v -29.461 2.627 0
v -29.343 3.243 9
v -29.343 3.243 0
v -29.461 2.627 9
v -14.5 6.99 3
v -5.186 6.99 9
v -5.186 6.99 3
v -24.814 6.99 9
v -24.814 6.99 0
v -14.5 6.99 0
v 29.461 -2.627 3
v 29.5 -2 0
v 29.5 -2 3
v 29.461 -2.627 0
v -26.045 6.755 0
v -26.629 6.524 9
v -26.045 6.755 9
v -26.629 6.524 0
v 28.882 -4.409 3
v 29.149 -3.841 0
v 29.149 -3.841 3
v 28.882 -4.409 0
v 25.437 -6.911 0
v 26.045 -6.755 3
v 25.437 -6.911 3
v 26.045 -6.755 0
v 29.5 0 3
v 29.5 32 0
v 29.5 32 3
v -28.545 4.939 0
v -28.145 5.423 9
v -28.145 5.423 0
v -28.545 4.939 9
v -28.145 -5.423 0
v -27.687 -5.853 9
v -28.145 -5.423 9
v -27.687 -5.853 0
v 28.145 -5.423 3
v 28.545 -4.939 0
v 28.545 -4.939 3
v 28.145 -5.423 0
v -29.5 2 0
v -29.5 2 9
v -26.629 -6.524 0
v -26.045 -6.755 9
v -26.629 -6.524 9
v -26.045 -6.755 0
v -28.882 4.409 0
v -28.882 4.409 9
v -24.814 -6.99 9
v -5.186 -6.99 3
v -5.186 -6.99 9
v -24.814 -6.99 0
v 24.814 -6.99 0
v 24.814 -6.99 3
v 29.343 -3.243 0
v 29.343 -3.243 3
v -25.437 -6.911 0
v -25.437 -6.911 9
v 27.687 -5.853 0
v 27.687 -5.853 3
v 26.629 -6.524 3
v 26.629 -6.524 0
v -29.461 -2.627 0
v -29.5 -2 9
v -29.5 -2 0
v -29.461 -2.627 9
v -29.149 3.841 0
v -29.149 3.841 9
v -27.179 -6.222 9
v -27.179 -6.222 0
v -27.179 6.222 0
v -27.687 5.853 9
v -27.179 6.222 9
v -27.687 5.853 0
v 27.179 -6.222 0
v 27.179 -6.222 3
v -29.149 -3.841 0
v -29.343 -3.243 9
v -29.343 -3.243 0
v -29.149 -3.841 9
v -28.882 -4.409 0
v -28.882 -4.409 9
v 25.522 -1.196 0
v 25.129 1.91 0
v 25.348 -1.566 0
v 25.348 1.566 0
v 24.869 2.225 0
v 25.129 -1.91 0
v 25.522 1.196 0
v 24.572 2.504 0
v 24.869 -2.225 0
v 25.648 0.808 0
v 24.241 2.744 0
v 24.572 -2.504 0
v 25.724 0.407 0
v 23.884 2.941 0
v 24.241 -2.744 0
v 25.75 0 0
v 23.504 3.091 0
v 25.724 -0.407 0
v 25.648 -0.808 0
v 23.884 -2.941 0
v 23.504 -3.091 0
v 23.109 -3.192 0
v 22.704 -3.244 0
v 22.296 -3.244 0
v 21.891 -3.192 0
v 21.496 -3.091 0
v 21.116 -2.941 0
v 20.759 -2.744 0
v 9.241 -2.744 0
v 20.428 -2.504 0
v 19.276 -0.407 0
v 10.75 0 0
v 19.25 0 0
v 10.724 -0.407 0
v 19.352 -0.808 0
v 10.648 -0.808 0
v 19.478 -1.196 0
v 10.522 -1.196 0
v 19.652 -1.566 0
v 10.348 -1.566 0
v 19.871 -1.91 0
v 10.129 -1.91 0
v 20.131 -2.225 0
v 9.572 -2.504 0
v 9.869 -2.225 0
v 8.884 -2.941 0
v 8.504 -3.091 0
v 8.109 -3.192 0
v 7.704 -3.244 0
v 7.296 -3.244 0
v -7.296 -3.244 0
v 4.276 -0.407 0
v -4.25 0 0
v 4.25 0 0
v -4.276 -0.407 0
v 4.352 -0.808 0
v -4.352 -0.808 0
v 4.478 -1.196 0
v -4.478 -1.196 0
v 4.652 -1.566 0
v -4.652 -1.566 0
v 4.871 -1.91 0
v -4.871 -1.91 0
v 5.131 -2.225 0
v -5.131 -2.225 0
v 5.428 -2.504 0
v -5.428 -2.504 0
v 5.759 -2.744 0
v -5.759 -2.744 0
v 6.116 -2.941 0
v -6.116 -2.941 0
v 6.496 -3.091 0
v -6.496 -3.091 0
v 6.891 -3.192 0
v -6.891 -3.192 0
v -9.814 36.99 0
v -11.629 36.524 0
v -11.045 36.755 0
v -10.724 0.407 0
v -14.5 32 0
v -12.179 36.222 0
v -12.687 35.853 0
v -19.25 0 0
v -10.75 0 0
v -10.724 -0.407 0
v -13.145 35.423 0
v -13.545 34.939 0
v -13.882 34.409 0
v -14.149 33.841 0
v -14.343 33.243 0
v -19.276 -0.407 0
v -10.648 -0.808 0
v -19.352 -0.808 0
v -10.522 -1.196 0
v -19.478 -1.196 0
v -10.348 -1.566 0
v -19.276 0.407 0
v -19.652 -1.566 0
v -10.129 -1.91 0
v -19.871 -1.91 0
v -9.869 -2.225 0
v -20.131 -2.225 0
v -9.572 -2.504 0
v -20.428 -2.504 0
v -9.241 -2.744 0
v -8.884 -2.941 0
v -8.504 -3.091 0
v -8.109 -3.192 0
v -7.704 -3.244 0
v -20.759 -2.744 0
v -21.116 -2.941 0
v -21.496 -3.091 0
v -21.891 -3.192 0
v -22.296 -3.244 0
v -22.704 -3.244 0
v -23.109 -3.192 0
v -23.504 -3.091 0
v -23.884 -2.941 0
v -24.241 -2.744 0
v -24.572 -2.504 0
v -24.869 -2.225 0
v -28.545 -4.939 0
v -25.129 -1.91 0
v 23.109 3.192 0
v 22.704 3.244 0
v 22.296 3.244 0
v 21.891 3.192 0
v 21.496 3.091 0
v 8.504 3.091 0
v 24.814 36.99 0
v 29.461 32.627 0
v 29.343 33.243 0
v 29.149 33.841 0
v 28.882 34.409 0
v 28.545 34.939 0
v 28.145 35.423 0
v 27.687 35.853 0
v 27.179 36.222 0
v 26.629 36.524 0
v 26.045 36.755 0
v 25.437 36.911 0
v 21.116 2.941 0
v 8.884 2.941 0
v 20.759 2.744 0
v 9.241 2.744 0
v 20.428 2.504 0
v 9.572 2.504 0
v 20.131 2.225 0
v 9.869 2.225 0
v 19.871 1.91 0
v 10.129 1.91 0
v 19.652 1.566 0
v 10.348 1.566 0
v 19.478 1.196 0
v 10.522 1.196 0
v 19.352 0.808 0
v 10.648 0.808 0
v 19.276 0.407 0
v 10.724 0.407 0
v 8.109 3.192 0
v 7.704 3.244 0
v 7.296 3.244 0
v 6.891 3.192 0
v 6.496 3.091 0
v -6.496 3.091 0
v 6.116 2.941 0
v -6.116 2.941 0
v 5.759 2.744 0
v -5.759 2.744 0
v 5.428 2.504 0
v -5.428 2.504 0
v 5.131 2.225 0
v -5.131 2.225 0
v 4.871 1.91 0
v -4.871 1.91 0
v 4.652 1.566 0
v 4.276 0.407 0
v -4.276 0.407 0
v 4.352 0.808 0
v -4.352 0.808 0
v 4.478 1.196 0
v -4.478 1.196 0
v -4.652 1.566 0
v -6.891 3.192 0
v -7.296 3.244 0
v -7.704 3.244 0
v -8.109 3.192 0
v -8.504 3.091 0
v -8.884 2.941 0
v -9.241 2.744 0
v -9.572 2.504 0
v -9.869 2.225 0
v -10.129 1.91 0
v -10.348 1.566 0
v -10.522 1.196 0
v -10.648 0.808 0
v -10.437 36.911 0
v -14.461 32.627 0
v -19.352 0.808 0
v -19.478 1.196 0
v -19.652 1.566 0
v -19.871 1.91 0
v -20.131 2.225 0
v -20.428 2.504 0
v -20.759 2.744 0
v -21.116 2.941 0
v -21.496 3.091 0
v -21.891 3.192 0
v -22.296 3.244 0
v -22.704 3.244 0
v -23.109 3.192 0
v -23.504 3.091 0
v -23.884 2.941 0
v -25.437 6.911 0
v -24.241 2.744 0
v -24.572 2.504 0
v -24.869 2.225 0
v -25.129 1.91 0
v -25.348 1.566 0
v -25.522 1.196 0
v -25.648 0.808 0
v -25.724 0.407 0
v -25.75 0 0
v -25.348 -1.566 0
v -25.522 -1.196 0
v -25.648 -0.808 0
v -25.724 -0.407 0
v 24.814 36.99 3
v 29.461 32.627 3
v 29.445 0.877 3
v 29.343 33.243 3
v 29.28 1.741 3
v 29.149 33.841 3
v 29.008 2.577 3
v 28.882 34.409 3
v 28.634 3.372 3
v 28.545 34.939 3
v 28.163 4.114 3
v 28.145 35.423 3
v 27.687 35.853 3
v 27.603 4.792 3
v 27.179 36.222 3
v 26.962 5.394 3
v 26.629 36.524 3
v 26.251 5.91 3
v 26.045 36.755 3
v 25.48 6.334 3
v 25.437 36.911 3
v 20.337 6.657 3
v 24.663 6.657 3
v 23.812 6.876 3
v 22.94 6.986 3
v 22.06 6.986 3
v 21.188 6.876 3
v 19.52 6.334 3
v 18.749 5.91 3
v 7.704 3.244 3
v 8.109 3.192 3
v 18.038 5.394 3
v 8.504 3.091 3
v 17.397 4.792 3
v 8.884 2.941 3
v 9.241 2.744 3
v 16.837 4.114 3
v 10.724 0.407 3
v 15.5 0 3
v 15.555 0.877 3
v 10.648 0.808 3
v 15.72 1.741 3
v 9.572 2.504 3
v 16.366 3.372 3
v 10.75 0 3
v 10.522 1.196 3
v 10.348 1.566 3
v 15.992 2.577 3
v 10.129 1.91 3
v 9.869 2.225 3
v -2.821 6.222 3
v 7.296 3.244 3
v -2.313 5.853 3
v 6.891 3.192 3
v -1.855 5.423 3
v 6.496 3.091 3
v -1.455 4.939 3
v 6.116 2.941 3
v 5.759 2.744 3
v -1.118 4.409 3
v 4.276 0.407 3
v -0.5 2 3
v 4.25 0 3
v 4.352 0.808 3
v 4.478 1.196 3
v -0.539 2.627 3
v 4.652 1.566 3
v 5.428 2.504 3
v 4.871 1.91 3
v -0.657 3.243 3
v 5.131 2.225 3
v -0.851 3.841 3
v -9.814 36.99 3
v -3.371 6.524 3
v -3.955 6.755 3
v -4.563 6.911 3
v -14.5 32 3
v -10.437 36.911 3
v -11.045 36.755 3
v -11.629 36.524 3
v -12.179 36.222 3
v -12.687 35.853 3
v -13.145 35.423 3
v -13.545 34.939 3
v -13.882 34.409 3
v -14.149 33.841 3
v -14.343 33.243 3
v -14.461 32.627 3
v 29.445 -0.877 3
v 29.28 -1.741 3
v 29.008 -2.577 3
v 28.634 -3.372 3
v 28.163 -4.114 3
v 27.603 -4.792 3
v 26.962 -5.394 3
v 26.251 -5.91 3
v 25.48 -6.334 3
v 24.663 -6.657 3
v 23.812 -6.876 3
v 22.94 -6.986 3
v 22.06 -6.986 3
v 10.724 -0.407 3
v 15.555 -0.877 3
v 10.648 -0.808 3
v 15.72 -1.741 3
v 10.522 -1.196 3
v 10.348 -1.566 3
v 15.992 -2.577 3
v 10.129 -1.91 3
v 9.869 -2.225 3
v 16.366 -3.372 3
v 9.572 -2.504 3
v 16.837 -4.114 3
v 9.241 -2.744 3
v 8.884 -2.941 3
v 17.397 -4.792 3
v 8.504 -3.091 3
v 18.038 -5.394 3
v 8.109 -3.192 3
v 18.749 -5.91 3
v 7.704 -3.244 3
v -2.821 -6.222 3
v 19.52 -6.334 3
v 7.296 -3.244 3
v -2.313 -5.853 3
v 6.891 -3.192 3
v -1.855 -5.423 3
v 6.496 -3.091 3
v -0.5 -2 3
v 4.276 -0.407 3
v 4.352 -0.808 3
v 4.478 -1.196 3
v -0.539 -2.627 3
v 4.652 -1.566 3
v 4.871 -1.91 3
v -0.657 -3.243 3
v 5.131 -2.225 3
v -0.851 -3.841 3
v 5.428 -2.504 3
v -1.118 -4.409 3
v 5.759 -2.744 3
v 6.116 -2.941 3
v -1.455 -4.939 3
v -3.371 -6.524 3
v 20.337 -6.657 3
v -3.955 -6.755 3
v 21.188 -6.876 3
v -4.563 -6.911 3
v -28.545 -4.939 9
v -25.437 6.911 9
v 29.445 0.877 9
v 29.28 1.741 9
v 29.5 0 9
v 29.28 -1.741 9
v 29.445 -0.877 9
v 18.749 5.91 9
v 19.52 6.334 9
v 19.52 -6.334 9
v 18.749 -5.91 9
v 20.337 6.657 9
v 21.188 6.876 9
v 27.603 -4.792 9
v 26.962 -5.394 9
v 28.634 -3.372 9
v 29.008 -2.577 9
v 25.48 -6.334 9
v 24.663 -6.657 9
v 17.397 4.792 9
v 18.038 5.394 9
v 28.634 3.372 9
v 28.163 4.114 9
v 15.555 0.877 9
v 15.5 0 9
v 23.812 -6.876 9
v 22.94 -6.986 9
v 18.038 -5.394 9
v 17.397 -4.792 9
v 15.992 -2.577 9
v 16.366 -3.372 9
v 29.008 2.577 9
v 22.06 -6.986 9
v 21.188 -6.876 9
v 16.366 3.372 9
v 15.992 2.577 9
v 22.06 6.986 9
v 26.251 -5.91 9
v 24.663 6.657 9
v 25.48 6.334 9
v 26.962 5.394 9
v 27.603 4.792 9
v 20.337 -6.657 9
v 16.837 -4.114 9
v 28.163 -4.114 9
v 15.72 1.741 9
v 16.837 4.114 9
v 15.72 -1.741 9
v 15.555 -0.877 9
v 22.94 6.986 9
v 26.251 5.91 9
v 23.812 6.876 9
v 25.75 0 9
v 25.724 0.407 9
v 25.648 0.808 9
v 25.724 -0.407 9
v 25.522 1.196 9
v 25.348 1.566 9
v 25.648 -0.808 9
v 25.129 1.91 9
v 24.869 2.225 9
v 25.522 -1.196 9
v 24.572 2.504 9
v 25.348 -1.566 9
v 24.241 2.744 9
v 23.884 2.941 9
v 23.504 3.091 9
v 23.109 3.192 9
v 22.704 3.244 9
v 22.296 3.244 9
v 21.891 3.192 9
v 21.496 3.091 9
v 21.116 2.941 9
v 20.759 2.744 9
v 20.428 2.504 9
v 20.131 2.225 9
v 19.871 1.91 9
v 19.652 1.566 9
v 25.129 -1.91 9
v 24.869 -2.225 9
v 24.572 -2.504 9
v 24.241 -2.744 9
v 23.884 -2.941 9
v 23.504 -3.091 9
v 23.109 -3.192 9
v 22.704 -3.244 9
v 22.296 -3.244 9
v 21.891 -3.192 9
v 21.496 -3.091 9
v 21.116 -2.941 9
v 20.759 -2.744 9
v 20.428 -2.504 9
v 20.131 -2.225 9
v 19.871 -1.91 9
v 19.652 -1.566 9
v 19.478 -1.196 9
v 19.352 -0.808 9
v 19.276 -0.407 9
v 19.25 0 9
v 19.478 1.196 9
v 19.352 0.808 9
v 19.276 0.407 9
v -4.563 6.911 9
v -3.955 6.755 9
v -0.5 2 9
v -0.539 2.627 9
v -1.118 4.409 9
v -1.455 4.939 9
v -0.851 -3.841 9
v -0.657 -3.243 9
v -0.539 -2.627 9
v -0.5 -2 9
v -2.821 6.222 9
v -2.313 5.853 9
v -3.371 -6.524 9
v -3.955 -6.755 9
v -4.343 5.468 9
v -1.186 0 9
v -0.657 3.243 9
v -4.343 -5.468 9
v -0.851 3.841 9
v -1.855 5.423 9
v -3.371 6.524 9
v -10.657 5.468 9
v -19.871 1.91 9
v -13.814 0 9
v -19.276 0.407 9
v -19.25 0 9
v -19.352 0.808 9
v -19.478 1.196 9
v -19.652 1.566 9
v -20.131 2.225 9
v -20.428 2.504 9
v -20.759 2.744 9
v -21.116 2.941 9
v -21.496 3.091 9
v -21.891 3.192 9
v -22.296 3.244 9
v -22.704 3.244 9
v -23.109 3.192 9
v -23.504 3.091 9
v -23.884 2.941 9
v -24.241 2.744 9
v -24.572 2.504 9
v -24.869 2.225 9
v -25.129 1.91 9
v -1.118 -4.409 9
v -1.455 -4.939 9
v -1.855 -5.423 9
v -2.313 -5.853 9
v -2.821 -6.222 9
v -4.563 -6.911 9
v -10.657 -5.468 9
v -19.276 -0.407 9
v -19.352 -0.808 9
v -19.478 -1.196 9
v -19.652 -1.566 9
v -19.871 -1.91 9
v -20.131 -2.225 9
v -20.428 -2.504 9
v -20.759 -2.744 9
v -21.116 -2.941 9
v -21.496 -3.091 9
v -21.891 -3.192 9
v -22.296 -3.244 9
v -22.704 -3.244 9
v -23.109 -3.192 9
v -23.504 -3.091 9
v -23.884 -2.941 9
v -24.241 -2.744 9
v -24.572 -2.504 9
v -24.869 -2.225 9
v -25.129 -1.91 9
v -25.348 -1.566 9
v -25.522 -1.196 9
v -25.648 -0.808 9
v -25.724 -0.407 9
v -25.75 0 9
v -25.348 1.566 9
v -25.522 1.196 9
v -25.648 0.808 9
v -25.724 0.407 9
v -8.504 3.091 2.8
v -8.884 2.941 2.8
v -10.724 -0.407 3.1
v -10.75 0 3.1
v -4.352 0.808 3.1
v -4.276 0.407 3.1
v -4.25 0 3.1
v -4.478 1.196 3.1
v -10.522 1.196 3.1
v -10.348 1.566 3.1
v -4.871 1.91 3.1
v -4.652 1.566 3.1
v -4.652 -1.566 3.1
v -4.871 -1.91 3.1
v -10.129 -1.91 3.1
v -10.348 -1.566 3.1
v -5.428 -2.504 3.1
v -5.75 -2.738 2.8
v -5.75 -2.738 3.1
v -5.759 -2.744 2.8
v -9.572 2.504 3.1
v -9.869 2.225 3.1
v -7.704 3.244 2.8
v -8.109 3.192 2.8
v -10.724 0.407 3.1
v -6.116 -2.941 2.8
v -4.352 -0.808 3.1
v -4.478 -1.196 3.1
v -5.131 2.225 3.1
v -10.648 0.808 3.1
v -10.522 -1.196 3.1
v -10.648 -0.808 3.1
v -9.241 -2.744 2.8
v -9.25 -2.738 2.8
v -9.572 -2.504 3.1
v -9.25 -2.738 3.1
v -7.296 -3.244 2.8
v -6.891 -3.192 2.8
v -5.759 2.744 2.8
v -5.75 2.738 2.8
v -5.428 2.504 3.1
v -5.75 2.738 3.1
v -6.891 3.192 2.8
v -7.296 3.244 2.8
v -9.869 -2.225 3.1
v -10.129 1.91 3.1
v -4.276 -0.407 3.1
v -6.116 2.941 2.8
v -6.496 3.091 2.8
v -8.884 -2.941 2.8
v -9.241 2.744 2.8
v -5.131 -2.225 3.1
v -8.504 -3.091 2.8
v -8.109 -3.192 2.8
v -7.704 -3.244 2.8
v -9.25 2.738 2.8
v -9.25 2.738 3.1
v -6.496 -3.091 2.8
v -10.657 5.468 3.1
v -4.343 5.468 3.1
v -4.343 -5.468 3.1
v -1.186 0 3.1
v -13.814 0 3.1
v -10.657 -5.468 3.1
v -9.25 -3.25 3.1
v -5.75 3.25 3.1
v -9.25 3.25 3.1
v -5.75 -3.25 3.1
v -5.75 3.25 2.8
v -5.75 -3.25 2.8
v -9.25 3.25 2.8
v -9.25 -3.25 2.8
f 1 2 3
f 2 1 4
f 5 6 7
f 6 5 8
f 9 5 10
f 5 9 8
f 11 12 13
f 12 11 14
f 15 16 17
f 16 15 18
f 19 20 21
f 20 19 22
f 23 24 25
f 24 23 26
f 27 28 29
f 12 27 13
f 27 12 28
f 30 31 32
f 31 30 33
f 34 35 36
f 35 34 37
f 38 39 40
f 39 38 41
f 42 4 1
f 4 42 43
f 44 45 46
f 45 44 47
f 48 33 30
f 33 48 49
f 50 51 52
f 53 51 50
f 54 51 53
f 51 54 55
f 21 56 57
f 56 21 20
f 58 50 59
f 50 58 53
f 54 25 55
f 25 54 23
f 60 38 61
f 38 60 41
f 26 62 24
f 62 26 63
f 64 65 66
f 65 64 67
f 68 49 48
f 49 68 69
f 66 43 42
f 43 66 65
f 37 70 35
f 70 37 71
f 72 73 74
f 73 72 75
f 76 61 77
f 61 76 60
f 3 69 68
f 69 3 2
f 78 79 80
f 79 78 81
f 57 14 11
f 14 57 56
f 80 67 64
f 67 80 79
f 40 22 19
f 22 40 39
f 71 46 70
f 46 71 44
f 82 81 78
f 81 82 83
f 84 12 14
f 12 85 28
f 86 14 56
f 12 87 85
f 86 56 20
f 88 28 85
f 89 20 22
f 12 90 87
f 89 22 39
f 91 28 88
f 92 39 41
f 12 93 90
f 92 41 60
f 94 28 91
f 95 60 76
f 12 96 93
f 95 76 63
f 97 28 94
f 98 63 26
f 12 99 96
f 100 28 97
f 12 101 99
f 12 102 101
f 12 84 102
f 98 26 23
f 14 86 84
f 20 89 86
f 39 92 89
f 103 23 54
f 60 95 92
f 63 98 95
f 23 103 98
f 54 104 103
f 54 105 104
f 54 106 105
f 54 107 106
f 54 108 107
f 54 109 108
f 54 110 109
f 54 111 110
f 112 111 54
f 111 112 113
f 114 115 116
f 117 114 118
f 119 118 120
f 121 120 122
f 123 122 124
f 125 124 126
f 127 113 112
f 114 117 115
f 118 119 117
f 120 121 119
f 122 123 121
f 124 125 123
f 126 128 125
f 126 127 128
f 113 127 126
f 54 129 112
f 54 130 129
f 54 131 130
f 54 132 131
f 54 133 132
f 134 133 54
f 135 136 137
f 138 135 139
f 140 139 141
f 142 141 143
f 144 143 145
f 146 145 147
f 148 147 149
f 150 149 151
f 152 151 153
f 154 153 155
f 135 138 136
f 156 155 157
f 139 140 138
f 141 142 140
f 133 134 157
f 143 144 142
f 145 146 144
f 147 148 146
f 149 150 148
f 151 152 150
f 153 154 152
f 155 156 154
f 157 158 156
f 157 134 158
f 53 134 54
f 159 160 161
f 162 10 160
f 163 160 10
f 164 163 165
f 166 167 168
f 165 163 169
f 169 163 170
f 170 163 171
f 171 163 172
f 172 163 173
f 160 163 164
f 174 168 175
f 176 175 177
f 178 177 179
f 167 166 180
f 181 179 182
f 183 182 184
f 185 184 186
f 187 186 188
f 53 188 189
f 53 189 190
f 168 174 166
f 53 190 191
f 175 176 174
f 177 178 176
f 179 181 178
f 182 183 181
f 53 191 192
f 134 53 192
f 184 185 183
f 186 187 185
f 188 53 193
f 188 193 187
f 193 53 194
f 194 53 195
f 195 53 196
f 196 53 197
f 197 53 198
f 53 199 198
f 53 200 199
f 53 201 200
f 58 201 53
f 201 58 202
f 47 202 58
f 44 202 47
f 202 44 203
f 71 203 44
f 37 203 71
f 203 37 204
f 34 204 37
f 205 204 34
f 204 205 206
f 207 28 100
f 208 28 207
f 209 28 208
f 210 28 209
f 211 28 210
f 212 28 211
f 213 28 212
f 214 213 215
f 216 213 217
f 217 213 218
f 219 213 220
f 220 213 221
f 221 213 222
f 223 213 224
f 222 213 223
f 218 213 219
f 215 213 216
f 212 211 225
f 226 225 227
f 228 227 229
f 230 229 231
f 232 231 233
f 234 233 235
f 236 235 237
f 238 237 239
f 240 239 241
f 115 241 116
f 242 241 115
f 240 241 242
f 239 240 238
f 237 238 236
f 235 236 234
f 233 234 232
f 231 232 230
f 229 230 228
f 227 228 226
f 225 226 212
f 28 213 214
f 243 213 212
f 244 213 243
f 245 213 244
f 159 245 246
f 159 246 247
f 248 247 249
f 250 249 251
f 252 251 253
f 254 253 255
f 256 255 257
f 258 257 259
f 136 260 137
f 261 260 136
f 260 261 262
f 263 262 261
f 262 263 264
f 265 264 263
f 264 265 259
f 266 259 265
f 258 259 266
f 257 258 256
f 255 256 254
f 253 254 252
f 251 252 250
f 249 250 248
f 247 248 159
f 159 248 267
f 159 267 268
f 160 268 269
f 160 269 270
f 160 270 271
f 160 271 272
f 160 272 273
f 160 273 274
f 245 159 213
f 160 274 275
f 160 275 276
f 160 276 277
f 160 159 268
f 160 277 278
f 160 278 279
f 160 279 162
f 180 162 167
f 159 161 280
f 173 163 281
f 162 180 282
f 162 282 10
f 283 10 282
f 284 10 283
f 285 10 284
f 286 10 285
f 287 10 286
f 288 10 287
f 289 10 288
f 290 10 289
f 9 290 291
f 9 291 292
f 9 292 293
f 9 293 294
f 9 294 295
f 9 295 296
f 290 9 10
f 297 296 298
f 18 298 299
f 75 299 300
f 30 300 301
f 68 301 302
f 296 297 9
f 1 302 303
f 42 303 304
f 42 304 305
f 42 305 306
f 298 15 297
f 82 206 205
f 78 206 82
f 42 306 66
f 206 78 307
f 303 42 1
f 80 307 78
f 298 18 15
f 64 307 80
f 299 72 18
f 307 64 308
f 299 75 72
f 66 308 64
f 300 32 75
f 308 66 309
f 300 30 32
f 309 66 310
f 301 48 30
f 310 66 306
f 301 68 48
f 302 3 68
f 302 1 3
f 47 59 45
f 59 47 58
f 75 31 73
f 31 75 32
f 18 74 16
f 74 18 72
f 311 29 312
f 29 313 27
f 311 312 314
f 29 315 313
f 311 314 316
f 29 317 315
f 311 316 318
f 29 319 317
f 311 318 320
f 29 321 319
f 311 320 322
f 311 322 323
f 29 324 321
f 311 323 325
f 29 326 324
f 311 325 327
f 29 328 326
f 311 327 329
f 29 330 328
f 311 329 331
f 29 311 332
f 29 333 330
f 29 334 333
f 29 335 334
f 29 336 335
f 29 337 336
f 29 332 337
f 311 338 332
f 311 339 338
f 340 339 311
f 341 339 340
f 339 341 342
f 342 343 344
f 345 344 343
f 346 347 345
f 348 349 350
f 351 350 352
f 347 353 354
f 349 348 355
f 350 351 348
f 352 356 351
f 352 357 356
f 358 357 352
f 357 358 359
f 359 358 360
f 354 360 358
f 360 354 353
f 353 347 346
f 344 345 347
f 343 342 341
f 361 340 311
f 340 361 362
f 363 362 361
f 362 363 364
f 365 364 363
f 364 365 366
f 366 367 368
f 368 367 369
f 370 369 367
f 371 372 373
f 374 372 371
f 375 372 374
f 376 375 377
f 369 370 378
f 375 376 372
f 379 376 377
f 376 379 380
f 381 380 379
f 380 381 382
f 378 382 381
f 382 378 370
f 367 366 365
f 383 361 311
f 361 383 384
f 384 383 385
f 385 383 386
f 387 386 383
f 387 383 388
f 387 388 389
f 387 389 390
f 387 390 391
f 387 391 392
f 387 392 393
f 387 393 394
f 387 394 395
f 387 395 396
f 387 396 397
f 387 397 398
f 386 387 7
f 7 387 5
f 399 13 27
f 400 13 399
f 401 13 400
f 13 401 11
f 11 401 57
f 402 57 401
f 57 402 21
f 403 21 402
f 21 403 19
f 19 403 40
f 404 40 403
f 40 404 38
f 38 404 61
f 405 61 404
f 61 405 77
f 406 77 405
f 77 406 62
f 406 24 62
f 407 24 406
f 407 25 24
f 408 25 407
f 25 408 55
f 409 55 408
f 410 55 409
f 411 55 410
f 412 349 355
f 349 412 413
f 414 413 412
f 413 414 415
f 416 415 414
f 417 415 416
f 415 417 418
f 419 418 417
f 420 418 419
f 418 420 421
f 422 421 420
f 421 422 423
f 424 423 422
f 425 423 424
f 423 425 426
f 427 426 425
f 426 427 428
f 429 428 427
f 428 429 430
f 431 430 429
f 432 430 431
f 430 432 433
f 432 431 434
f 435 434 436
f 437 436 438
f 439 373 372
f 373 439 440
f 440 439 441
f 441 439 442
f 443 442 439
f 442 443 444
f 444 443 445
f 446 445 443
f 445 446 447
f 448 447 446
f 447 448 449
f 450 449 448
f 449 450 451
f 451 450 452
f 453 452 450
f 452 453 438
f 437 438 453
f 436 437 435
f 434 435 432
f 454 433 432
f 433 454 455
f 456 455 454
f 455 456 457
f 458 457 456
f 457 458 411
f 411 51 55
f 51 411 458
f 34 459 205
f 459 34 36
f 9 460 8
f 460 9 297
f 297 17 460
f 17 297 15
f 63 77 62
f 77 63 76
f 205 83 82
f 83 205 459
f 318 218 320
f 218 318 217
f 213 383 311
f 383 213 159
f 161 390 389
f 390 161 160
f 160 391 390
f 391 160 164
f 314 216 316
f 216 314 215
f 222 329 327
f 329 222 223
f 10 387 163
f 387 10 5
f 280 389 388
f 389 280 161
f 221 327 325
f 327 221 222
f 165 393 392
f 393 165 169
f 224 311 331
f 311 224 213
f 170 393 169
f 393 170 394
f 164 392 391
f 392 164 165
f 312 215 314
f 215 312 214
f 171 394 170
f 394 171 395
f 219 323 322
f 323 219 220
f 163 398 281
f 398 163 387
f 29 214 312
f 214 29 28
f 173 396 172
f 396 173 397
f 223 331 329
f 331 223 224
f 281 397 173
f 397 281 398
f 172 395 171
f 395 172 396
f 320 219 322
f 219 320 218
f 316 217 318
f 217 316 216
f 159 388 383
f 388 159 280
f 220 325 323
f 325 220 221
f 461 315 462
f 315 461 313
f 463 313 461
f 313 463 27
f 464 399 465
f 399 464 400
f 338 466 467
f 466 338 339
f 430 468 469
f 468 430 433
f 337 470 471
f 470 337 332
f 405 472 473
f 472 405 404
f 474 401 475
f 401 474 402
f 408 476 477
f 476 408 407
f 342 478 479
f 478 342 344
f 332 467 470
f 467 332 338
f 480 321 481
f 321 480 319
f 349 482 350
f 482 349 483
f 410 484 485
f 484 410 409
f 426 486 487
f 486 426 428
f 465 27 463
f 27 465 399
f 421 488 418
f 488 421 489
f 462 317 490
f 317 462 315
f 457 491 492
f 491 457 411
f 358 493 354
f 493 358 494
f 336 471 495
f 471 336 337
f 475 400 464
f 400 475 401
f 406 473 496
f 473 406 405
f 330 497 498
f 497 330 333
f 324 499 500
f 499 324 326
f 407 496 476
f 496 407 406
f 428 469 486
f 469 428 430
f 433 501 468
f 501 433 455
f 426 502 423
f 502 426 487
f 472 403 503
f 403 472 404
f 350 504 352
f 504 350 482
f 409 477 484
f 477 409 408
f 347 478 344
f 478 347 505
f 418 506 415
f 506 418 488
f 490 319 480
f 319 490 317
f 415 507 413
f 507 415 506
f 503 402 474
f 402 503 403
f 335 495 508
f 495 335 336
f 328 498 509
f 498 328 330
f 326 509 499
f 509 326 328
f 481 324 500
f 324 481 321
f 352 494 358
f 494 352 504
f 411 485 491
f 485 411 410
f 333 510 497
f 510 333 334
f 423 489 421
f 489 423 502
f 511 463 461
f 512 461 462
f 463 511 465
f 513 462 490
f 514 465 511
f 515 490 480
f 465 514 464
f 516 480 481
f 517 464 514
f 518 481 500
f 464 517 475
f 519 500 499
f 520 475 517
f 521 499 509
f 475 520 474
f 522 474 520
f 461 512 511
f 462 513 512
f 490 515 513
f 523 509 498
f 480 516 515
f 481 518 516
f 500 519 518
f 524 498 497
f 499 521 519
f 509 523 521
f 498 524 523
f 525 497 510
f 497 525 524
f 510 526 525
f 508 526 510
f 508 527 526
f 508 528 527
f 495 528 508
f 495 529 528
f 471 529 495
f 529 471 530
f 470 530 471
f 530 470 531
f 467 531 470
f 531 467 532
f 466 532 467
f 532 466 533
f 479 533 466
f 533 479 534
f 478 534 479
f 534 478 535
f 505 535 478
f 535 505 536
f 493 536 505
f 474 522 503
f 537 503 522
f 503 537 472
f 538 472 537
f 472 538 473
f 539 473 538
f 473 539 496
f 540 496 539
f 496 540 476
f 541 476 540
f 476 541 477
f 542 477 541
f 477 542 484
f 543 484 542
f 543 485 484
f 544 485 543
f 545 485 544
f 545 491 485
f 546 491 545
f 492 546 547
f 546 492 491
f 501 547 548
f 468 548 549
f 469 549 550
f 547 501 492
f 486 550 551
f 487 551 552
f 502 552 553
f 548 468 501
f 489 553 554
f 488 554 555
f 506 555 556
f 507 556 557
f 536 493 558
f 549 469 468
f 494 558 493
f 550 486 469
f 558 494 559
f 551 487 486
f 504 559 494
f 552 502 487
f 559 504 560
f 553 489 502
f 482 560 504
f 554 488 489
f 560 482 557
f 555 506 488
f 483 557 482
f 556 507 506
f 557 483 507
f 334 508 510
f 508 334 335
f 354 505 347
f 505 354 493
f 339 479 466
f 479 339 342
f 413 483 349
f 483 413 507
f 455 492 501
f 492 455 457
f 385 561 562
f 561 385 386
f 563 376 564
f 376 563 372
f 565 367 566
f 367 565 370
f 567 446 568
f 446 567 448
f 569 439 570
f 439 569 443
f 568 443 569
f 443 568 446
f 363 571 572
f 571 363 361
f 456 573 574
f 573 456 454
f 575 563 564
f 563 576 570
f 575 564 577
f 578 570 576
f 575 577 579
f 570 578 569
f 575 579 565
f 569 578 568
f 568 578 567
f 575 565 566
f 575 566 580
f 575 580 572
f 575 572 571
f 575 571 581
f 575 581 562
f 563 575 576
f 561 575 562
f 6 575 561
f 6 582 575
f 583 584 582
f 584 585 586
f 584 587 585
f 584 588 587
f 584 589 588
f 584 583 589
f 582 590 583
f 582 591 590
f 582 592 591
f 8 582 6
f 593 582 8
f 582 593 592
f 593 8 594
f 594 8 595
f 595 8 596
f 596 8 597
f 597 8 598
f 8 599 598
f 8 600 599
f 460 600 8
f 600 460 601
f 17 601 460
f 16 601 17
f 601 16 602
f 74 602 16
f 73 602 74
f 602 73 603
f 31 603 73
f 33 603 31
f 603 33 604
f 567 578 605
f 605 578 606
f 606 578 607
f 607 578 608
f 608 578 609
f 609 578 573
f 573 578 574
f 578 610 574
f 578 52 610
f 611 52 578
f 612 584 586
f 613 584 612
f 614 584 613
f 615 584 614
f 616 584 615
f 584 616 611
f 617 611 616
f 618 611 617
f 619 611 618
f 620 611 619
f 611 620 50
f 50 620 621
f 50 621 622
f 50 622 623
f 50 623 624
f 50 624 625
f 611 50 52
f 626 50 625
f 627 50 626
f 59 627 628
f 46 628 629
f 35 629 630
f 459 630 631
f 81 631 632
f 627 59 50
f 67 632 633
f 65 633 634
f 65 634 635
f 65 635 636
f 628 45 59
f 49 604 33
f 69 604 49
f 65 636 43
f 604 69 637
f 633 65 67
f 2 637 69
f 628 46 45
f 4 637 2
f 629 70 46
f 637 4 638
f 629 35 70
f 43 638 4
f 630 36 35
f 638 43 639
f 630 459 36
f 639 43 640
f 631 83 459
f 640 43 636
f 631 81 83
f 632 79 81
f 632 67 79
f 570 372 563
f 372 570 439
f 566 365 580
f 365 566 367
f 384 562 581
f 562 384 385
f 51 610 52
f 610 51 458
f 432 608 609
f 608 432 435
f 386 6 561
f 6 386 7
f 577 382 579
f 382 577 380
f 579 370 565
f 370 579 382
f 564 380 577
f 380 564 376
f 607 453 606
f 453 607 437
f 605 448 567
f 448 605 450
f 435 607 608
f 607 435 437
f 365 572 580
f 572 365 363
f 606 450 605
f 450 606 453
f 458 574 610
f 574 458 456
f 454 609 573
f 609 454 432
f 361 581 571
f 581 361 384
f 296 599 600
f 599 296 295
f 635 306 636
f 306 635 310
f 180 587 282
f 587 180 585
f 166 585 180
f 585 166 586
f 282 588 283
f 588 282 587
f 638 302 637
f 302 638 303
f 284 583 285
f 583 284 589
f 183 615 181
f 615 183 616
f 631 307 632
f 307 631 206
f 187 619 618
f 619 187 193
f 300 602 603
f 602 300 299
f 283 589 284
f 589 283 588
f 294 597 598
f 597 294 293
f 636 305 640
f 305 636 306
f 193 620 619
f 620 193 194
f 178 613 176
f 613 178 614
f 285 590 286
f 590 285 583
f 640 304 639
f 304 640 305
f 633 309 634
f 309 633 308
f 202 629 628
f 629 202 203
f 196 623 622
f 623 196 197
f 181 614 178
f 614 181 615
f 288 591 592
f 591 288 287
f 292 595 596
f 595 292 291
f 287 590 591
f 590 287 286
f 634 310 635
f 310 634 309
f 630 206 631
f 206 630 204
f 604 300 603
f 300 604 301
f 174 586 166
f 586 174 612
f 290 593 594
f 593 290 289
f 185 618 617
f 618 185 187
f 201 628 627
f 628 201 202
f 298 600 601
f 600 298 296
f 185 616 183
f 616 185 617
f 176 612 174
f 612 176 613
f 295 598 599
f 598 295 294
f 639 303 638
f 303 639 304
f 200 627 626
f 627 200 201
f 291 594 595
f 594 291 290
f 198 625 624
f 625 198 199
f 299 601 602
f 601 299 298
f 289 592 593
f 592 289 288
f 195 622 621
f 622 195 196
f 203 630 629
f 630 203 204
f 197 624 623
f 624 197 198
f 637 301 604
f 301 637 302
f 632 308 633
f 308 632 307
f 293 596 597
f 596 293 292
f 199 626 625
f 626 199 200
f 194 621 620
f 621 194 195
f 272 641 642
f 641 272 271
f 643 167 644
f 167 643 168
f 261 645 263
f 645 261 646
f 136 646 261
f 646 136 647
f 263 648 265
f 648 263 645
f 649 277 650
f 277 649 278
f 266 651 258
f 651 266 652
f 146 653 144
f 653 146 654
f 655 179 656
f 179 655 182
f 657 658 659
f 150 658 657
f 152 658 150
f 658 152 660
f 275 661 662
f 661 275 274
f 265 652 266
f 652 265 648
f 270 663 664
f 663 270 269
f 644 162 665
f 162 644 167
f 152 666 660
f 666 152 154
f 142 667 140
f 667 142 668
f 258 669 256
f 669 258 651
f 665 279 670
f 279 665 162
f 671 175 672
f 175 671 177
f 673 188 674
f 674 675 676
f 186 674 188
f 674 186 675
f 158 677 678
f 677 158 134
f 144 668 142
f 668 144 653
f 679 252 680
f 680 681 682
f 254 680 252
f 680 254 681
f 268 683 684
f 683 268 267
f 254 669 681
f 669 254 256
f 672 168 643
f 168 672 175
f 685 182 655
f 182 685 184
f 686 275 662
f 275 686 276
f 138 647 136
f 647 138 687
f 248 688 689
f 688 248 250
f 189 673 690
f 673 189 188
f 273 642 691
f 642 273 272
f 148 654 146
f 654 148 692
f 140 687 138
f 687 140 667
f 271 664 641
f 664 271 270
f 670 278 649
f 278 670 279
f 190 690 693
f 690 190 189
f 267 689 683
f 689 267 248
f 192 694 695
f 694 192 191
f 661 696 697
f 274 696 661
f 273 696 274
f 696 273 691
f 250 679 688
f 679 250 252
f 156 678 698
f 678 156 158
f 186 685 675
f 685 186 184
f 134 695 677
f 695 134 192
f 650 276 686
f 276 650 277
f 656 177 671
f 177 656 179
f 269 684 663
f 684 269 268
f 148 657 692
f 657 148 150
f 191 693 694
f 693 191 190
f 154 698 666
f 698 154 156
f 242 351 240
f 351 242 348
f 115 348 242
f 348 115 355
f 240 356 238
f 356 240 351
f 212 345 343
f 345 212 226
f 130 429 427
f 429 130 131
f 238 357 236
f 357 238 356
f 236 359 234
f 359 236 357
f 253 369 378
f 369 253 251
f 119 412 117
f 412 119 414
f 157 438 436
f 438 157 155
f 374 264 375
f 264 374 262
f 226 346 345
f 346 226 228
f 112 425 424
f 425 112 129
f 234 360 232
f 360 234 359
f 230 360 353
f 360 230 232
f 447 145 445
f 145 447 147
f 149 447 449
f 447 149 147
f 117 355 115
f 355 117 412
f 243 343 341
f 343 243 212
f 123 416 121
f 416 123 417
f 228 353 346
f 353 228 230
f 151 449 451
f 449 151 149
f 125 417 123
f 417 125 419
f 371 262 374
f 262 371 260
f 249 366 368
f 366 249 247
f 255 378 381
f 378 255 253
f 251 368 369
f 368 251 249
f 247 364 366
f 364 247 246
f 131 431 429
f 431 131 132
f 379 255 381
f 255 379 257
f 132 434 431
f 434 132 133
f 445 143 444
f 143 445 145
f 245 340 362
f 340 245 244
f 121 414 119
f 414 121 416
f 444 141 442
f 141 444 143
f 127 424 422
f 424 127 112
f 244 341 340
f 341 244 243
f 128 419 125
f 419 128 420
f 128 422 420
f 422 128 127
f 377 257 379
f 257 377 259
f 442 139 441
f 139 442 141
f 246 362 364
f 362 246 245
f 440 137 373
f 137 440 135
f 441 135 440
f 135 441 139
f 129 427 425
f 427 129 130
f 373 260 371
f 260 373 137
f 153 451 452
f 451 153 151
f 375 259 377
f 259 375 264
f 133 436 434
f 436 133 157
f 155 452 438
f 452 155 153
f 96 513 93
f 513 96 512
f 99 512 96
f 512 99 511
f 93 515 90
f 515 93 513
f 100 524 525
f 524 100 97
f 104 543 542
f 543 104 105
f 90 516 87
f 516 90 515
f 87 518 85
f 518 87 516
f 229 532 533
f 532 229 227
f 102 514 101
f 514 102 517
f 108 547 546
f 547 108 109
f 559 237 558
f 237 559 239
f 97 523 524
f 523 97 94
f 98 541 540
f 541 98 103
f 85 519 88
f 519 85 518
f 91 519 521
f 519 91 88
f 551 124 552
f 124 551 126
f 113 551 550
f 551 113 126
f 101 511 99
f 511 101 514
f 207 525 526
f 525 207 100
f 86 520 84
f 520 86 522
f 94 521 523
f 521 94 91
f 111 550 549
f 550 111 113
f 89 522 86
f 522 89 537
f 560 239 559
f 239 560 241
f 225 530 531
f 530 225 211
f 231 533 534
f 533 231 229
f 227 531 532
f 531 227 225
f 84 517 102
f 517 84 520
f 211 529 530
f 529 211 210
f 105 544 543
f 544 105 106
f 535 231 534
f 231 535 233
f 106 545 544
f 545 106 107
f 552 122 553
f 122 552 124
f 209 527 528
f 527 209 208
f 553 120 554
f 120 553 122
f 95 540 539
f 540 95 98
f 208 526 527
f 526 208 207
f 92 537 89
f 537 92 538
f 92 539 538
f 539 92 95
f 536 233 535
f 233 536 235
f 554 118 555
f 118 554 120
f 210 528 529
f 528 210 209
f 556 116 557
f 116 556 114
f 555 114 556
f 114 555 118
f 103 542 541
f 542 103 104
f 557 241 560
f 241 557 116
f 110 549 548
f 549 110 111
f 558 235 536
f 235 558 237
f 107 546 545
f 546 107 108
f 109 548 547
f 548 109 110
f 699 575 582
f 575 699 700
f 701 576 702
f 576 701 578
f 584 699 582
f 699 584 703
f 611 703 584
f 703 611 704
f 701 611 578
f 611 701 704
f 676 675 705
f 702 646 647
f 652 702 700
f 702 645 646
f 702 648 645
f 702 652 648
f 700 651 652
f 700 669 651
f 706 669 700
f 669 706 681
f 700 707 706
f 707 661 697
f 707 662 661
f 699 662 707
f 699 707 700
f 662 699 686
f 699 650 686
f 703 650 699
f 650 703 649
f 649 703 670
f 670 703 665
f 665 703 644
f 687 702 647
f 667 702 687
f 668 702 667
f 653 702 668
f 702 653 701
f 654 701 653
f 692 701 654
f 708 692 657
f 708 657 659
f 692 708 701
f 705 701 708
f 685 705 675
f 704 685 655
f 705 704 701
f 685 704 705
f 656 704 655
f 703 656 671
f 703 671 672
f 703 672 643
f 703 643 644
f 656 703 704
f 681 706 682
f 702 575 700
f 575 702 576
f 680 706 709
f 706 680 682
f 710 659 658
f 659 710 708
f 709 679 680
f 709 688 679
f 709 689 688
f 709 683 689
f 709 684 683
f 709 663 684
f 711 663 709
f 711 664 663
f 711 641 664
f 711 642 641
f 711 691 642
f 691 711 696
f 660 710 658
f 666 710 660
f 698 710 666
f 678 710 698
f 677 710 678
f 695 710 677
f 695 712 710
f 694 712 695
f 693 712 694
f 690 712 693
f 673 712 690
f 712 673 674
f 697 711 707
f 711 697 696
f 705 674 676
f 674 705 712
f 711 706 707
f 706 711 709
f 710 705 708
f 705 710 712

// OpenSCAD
$fn = 50;


difference() {
	union() {
		translate(v = [0, 0, 0]) {
			rotate(a = [0, 0, 0]) {
				hull() {
					translate(v = [-24.5000000000, 2.0000000000, 0]) {
						rotate(a = [0, 0, 0]) {
							translate(v = [0, 0, 0]) {
								rotate(a = [0, 0, 0]) {
									cylinder(h = 3, r = 5);
								}
							}
						}
					}
					translate(v = [24.5000000000, 2.0000000000, 0]) {
						rotate(a = [0, 0, 0]) {
							translate(v = [0, 0, 0]) {
								rotate(a = [0, 0, 0]) {
									cylinder(h = 3, r = 5);
								}
							}
						}
					}
					translate(v = [-24.5000000000, -2.0000000000, 0]) {
						rotate(a = [0, 0, 0]) {
							translate(v = [0, 0, 0]) {
								rotate(a = [0, 0, 0]) {
									cylinder(h = 3, r = 5);
								}
							}
						}
					}
					translate(v = [24.5000000000, -2.0000000000, 0]) {
						rotate(a = [0, 0, 0]) {
							translate(v = [0, 0, 0]) {
								rotate(a = [0, 0, 0]) {
									cylinder(h = 3, r = 5);
								}
							}
						}
					}
				}
			}
		}
		translate(v = [7.5000000000, 15.0000000000, 0]) {
			rotate(a = [0, 0, 0]) {
				hull() {
					translate(v = [-17.0000000000, 17.0000000000, 0]) {
						rotate(a = [0, 0, 0]) {
							translate(v = [0, 0, 0]) {
								rotate(a = [0, 0, 0]) {
									cylinder(h = 3, r = 5);
								}
							}
						}
					}
					translate(v = [17.0000000000, 17.0000000000, 0]) {
						rotate(a = [0, 0, 0]) {
							translate(v = [0, 0, 0]) {
								rotate(a = [0, 0, 0]) {
									cylinder(h = 3, r = 5);
								}
							}
						}
					}
					translate(v = [-17.0000000000, -17.0000000000, 0]) {
						rotate(a = [0, 0, 0]) {
							translate(v = [0, 0, 0]) {
								rotate(a = [0, 0, 0]) {
									cylinder(h = 3, r = 5);
								}
							}
						}
					}
					translate(v = [17.0000000000, -17.0000000000, 0]) {
						rotate(a = [0, 0, 0]) {
							translate(v = [0, 0, 0]) {
								rotate(a = [0, 0, 0]) {
									cylinder(h = 3, r = 5);
								}
							}
						}
					}
				}
			}
		}
		translate(v = [22.5000000000, 0, 0]) {
			rotate(a = [0, 0, 0]) {
				cylinder(h = 9, r = 7.0000000000);
			}
		}
		translate(v = [-15.0000000000, 0, 0]) {
			rotate(a = [0, 0, 0]) {
				hull() {
					translate(v = [-9.5000000000, 2.0000000000, 0]) {
						rotate(a = [0, 0, 0]) {
							translate(v = [0, 0, 0]) {
								rotate(a = [0, 0, 0]) {
									cylinder(h = 9, r = 5);
								}
							}
						}
					}
					translate(v = [9.5000000000, 2.0000000000, 0]) {
						rotate(a = [0, 0, 0]) {
							translate(v = [0, 0, 0]) {
								rotate(a = [0, 0, 0]) {
									cylinder(h = 9, r = 5);
								}
							}
						}
					}
					translate(v = [-9.5000000000, -2.0000000000, 0]) {
						rotate(a = [0, 0, 0]) {
							translate(v = [0, 0, 0]) {
								rotate(a = [0, 0, 0]) {
									cylinder(h = 9, r = 5);
								}
							}
						}
					}
					translate(v = [9.5000000000, -2.0000000000, 0]) {
						rotate(a = [0, 0, 0]) {
							translate(v = [0, 0, 0]) {
								rotate(a = [0, 0, 0]) {
									cylinder(h = 9, r = 5);
								}
							}
						}
					}
				}
			}
		}
	}
	union() {
		translate(v = [-22.5000000000, 0.0000000000, 0]) {
			rotate(a = [0, 0, 0]) {
				translate(v = [0, 0, -50]) {
					rotate(a = [0, 0, 0]) {
						cylinder(h = 100, r = 3.2500000000);
					}
				}
			}
		}
		translate(v = [-7.5000000000, 0.0000000000, 0]) {
			rotate(a = [0, 0, 0]) {
				translate(v = [0, 0, -50]) {
					rotate(a = [0, 0, 0]) {
						cylinder(h = 100, r = 3.2500000000);
					}
				}
			}
		}
		translate(v = [7.5000000000, 0.0000000000, 0]) {
			rotate(a = [0, 0, 0]) {
				translate(v = [0, 0, -50]) {
					rotate(a = [0, 0, 0]) {
						cylinder(h = 100, r = 3.2500000000);
					}
				}
			}
		}
		translate(v = [22.5000000000, 0.0000000000, 0]) {
			rotate(a = [0, 0, 0]) {
				translate(v = [0, 0, -50]) {
					rotate(a = [0, 0, 0]) {
						cylinder(h = 100, r = 3.2500000000);
					}
				}
			}
		}
		translate(v = [-7.5000000000, 0, 3.1000000000]) {
			rotate(a = [0, 0, 0]) {
				translate(v = [0, 0, 0]) {
					rotate(a = [0, 0, 0]) {
						linear_extrude(height = 5.9000000000) {
							polygon(points = [[6.3142500000, 0.0000000000], [3.1571250000, 5.4683009058], [-3.1571250000, 5.4683009058], [-6.3142500000, 0.0000000000], [-3.1571250000, -5.4683009058], [3.1571250000, -5.4683009058]]);
						}
					}
				}
			}
		}
		translate(v = [-9.2500000000, -3.2500000000, 9.0000000000]) {
			rotate(a = [0, 0, 0]) {
				cube(size = [3.5000000000, 6.5000000000, 0.3000000000]);
			}
		}
		translate(v = [-9.2500000000, -1.7500000000, 9.3000000000]) {
			rotate(a = [0, 0, 0]) {
				cube(size = [3.5000000000, 3.5000000000, 0.3000000000]);
			}
		}
		translate(v = [-9.2500000000, -3.2500000000, 2.8000000000]) {
			rotate(a = [0, 0, 0]) {
				cube(size = [3.5000000000, 6.5000000000, 0.3000000000]);
			}
		}
		translate(v = [-9.2500000000, -1.7500000000, 2.5000000000]) {
			rotate(a = [0, 0, 0]) {
				cube(size = [3.5000000000, 3.5000000000, 0.3000000000]);
			}
		}
	}
}
